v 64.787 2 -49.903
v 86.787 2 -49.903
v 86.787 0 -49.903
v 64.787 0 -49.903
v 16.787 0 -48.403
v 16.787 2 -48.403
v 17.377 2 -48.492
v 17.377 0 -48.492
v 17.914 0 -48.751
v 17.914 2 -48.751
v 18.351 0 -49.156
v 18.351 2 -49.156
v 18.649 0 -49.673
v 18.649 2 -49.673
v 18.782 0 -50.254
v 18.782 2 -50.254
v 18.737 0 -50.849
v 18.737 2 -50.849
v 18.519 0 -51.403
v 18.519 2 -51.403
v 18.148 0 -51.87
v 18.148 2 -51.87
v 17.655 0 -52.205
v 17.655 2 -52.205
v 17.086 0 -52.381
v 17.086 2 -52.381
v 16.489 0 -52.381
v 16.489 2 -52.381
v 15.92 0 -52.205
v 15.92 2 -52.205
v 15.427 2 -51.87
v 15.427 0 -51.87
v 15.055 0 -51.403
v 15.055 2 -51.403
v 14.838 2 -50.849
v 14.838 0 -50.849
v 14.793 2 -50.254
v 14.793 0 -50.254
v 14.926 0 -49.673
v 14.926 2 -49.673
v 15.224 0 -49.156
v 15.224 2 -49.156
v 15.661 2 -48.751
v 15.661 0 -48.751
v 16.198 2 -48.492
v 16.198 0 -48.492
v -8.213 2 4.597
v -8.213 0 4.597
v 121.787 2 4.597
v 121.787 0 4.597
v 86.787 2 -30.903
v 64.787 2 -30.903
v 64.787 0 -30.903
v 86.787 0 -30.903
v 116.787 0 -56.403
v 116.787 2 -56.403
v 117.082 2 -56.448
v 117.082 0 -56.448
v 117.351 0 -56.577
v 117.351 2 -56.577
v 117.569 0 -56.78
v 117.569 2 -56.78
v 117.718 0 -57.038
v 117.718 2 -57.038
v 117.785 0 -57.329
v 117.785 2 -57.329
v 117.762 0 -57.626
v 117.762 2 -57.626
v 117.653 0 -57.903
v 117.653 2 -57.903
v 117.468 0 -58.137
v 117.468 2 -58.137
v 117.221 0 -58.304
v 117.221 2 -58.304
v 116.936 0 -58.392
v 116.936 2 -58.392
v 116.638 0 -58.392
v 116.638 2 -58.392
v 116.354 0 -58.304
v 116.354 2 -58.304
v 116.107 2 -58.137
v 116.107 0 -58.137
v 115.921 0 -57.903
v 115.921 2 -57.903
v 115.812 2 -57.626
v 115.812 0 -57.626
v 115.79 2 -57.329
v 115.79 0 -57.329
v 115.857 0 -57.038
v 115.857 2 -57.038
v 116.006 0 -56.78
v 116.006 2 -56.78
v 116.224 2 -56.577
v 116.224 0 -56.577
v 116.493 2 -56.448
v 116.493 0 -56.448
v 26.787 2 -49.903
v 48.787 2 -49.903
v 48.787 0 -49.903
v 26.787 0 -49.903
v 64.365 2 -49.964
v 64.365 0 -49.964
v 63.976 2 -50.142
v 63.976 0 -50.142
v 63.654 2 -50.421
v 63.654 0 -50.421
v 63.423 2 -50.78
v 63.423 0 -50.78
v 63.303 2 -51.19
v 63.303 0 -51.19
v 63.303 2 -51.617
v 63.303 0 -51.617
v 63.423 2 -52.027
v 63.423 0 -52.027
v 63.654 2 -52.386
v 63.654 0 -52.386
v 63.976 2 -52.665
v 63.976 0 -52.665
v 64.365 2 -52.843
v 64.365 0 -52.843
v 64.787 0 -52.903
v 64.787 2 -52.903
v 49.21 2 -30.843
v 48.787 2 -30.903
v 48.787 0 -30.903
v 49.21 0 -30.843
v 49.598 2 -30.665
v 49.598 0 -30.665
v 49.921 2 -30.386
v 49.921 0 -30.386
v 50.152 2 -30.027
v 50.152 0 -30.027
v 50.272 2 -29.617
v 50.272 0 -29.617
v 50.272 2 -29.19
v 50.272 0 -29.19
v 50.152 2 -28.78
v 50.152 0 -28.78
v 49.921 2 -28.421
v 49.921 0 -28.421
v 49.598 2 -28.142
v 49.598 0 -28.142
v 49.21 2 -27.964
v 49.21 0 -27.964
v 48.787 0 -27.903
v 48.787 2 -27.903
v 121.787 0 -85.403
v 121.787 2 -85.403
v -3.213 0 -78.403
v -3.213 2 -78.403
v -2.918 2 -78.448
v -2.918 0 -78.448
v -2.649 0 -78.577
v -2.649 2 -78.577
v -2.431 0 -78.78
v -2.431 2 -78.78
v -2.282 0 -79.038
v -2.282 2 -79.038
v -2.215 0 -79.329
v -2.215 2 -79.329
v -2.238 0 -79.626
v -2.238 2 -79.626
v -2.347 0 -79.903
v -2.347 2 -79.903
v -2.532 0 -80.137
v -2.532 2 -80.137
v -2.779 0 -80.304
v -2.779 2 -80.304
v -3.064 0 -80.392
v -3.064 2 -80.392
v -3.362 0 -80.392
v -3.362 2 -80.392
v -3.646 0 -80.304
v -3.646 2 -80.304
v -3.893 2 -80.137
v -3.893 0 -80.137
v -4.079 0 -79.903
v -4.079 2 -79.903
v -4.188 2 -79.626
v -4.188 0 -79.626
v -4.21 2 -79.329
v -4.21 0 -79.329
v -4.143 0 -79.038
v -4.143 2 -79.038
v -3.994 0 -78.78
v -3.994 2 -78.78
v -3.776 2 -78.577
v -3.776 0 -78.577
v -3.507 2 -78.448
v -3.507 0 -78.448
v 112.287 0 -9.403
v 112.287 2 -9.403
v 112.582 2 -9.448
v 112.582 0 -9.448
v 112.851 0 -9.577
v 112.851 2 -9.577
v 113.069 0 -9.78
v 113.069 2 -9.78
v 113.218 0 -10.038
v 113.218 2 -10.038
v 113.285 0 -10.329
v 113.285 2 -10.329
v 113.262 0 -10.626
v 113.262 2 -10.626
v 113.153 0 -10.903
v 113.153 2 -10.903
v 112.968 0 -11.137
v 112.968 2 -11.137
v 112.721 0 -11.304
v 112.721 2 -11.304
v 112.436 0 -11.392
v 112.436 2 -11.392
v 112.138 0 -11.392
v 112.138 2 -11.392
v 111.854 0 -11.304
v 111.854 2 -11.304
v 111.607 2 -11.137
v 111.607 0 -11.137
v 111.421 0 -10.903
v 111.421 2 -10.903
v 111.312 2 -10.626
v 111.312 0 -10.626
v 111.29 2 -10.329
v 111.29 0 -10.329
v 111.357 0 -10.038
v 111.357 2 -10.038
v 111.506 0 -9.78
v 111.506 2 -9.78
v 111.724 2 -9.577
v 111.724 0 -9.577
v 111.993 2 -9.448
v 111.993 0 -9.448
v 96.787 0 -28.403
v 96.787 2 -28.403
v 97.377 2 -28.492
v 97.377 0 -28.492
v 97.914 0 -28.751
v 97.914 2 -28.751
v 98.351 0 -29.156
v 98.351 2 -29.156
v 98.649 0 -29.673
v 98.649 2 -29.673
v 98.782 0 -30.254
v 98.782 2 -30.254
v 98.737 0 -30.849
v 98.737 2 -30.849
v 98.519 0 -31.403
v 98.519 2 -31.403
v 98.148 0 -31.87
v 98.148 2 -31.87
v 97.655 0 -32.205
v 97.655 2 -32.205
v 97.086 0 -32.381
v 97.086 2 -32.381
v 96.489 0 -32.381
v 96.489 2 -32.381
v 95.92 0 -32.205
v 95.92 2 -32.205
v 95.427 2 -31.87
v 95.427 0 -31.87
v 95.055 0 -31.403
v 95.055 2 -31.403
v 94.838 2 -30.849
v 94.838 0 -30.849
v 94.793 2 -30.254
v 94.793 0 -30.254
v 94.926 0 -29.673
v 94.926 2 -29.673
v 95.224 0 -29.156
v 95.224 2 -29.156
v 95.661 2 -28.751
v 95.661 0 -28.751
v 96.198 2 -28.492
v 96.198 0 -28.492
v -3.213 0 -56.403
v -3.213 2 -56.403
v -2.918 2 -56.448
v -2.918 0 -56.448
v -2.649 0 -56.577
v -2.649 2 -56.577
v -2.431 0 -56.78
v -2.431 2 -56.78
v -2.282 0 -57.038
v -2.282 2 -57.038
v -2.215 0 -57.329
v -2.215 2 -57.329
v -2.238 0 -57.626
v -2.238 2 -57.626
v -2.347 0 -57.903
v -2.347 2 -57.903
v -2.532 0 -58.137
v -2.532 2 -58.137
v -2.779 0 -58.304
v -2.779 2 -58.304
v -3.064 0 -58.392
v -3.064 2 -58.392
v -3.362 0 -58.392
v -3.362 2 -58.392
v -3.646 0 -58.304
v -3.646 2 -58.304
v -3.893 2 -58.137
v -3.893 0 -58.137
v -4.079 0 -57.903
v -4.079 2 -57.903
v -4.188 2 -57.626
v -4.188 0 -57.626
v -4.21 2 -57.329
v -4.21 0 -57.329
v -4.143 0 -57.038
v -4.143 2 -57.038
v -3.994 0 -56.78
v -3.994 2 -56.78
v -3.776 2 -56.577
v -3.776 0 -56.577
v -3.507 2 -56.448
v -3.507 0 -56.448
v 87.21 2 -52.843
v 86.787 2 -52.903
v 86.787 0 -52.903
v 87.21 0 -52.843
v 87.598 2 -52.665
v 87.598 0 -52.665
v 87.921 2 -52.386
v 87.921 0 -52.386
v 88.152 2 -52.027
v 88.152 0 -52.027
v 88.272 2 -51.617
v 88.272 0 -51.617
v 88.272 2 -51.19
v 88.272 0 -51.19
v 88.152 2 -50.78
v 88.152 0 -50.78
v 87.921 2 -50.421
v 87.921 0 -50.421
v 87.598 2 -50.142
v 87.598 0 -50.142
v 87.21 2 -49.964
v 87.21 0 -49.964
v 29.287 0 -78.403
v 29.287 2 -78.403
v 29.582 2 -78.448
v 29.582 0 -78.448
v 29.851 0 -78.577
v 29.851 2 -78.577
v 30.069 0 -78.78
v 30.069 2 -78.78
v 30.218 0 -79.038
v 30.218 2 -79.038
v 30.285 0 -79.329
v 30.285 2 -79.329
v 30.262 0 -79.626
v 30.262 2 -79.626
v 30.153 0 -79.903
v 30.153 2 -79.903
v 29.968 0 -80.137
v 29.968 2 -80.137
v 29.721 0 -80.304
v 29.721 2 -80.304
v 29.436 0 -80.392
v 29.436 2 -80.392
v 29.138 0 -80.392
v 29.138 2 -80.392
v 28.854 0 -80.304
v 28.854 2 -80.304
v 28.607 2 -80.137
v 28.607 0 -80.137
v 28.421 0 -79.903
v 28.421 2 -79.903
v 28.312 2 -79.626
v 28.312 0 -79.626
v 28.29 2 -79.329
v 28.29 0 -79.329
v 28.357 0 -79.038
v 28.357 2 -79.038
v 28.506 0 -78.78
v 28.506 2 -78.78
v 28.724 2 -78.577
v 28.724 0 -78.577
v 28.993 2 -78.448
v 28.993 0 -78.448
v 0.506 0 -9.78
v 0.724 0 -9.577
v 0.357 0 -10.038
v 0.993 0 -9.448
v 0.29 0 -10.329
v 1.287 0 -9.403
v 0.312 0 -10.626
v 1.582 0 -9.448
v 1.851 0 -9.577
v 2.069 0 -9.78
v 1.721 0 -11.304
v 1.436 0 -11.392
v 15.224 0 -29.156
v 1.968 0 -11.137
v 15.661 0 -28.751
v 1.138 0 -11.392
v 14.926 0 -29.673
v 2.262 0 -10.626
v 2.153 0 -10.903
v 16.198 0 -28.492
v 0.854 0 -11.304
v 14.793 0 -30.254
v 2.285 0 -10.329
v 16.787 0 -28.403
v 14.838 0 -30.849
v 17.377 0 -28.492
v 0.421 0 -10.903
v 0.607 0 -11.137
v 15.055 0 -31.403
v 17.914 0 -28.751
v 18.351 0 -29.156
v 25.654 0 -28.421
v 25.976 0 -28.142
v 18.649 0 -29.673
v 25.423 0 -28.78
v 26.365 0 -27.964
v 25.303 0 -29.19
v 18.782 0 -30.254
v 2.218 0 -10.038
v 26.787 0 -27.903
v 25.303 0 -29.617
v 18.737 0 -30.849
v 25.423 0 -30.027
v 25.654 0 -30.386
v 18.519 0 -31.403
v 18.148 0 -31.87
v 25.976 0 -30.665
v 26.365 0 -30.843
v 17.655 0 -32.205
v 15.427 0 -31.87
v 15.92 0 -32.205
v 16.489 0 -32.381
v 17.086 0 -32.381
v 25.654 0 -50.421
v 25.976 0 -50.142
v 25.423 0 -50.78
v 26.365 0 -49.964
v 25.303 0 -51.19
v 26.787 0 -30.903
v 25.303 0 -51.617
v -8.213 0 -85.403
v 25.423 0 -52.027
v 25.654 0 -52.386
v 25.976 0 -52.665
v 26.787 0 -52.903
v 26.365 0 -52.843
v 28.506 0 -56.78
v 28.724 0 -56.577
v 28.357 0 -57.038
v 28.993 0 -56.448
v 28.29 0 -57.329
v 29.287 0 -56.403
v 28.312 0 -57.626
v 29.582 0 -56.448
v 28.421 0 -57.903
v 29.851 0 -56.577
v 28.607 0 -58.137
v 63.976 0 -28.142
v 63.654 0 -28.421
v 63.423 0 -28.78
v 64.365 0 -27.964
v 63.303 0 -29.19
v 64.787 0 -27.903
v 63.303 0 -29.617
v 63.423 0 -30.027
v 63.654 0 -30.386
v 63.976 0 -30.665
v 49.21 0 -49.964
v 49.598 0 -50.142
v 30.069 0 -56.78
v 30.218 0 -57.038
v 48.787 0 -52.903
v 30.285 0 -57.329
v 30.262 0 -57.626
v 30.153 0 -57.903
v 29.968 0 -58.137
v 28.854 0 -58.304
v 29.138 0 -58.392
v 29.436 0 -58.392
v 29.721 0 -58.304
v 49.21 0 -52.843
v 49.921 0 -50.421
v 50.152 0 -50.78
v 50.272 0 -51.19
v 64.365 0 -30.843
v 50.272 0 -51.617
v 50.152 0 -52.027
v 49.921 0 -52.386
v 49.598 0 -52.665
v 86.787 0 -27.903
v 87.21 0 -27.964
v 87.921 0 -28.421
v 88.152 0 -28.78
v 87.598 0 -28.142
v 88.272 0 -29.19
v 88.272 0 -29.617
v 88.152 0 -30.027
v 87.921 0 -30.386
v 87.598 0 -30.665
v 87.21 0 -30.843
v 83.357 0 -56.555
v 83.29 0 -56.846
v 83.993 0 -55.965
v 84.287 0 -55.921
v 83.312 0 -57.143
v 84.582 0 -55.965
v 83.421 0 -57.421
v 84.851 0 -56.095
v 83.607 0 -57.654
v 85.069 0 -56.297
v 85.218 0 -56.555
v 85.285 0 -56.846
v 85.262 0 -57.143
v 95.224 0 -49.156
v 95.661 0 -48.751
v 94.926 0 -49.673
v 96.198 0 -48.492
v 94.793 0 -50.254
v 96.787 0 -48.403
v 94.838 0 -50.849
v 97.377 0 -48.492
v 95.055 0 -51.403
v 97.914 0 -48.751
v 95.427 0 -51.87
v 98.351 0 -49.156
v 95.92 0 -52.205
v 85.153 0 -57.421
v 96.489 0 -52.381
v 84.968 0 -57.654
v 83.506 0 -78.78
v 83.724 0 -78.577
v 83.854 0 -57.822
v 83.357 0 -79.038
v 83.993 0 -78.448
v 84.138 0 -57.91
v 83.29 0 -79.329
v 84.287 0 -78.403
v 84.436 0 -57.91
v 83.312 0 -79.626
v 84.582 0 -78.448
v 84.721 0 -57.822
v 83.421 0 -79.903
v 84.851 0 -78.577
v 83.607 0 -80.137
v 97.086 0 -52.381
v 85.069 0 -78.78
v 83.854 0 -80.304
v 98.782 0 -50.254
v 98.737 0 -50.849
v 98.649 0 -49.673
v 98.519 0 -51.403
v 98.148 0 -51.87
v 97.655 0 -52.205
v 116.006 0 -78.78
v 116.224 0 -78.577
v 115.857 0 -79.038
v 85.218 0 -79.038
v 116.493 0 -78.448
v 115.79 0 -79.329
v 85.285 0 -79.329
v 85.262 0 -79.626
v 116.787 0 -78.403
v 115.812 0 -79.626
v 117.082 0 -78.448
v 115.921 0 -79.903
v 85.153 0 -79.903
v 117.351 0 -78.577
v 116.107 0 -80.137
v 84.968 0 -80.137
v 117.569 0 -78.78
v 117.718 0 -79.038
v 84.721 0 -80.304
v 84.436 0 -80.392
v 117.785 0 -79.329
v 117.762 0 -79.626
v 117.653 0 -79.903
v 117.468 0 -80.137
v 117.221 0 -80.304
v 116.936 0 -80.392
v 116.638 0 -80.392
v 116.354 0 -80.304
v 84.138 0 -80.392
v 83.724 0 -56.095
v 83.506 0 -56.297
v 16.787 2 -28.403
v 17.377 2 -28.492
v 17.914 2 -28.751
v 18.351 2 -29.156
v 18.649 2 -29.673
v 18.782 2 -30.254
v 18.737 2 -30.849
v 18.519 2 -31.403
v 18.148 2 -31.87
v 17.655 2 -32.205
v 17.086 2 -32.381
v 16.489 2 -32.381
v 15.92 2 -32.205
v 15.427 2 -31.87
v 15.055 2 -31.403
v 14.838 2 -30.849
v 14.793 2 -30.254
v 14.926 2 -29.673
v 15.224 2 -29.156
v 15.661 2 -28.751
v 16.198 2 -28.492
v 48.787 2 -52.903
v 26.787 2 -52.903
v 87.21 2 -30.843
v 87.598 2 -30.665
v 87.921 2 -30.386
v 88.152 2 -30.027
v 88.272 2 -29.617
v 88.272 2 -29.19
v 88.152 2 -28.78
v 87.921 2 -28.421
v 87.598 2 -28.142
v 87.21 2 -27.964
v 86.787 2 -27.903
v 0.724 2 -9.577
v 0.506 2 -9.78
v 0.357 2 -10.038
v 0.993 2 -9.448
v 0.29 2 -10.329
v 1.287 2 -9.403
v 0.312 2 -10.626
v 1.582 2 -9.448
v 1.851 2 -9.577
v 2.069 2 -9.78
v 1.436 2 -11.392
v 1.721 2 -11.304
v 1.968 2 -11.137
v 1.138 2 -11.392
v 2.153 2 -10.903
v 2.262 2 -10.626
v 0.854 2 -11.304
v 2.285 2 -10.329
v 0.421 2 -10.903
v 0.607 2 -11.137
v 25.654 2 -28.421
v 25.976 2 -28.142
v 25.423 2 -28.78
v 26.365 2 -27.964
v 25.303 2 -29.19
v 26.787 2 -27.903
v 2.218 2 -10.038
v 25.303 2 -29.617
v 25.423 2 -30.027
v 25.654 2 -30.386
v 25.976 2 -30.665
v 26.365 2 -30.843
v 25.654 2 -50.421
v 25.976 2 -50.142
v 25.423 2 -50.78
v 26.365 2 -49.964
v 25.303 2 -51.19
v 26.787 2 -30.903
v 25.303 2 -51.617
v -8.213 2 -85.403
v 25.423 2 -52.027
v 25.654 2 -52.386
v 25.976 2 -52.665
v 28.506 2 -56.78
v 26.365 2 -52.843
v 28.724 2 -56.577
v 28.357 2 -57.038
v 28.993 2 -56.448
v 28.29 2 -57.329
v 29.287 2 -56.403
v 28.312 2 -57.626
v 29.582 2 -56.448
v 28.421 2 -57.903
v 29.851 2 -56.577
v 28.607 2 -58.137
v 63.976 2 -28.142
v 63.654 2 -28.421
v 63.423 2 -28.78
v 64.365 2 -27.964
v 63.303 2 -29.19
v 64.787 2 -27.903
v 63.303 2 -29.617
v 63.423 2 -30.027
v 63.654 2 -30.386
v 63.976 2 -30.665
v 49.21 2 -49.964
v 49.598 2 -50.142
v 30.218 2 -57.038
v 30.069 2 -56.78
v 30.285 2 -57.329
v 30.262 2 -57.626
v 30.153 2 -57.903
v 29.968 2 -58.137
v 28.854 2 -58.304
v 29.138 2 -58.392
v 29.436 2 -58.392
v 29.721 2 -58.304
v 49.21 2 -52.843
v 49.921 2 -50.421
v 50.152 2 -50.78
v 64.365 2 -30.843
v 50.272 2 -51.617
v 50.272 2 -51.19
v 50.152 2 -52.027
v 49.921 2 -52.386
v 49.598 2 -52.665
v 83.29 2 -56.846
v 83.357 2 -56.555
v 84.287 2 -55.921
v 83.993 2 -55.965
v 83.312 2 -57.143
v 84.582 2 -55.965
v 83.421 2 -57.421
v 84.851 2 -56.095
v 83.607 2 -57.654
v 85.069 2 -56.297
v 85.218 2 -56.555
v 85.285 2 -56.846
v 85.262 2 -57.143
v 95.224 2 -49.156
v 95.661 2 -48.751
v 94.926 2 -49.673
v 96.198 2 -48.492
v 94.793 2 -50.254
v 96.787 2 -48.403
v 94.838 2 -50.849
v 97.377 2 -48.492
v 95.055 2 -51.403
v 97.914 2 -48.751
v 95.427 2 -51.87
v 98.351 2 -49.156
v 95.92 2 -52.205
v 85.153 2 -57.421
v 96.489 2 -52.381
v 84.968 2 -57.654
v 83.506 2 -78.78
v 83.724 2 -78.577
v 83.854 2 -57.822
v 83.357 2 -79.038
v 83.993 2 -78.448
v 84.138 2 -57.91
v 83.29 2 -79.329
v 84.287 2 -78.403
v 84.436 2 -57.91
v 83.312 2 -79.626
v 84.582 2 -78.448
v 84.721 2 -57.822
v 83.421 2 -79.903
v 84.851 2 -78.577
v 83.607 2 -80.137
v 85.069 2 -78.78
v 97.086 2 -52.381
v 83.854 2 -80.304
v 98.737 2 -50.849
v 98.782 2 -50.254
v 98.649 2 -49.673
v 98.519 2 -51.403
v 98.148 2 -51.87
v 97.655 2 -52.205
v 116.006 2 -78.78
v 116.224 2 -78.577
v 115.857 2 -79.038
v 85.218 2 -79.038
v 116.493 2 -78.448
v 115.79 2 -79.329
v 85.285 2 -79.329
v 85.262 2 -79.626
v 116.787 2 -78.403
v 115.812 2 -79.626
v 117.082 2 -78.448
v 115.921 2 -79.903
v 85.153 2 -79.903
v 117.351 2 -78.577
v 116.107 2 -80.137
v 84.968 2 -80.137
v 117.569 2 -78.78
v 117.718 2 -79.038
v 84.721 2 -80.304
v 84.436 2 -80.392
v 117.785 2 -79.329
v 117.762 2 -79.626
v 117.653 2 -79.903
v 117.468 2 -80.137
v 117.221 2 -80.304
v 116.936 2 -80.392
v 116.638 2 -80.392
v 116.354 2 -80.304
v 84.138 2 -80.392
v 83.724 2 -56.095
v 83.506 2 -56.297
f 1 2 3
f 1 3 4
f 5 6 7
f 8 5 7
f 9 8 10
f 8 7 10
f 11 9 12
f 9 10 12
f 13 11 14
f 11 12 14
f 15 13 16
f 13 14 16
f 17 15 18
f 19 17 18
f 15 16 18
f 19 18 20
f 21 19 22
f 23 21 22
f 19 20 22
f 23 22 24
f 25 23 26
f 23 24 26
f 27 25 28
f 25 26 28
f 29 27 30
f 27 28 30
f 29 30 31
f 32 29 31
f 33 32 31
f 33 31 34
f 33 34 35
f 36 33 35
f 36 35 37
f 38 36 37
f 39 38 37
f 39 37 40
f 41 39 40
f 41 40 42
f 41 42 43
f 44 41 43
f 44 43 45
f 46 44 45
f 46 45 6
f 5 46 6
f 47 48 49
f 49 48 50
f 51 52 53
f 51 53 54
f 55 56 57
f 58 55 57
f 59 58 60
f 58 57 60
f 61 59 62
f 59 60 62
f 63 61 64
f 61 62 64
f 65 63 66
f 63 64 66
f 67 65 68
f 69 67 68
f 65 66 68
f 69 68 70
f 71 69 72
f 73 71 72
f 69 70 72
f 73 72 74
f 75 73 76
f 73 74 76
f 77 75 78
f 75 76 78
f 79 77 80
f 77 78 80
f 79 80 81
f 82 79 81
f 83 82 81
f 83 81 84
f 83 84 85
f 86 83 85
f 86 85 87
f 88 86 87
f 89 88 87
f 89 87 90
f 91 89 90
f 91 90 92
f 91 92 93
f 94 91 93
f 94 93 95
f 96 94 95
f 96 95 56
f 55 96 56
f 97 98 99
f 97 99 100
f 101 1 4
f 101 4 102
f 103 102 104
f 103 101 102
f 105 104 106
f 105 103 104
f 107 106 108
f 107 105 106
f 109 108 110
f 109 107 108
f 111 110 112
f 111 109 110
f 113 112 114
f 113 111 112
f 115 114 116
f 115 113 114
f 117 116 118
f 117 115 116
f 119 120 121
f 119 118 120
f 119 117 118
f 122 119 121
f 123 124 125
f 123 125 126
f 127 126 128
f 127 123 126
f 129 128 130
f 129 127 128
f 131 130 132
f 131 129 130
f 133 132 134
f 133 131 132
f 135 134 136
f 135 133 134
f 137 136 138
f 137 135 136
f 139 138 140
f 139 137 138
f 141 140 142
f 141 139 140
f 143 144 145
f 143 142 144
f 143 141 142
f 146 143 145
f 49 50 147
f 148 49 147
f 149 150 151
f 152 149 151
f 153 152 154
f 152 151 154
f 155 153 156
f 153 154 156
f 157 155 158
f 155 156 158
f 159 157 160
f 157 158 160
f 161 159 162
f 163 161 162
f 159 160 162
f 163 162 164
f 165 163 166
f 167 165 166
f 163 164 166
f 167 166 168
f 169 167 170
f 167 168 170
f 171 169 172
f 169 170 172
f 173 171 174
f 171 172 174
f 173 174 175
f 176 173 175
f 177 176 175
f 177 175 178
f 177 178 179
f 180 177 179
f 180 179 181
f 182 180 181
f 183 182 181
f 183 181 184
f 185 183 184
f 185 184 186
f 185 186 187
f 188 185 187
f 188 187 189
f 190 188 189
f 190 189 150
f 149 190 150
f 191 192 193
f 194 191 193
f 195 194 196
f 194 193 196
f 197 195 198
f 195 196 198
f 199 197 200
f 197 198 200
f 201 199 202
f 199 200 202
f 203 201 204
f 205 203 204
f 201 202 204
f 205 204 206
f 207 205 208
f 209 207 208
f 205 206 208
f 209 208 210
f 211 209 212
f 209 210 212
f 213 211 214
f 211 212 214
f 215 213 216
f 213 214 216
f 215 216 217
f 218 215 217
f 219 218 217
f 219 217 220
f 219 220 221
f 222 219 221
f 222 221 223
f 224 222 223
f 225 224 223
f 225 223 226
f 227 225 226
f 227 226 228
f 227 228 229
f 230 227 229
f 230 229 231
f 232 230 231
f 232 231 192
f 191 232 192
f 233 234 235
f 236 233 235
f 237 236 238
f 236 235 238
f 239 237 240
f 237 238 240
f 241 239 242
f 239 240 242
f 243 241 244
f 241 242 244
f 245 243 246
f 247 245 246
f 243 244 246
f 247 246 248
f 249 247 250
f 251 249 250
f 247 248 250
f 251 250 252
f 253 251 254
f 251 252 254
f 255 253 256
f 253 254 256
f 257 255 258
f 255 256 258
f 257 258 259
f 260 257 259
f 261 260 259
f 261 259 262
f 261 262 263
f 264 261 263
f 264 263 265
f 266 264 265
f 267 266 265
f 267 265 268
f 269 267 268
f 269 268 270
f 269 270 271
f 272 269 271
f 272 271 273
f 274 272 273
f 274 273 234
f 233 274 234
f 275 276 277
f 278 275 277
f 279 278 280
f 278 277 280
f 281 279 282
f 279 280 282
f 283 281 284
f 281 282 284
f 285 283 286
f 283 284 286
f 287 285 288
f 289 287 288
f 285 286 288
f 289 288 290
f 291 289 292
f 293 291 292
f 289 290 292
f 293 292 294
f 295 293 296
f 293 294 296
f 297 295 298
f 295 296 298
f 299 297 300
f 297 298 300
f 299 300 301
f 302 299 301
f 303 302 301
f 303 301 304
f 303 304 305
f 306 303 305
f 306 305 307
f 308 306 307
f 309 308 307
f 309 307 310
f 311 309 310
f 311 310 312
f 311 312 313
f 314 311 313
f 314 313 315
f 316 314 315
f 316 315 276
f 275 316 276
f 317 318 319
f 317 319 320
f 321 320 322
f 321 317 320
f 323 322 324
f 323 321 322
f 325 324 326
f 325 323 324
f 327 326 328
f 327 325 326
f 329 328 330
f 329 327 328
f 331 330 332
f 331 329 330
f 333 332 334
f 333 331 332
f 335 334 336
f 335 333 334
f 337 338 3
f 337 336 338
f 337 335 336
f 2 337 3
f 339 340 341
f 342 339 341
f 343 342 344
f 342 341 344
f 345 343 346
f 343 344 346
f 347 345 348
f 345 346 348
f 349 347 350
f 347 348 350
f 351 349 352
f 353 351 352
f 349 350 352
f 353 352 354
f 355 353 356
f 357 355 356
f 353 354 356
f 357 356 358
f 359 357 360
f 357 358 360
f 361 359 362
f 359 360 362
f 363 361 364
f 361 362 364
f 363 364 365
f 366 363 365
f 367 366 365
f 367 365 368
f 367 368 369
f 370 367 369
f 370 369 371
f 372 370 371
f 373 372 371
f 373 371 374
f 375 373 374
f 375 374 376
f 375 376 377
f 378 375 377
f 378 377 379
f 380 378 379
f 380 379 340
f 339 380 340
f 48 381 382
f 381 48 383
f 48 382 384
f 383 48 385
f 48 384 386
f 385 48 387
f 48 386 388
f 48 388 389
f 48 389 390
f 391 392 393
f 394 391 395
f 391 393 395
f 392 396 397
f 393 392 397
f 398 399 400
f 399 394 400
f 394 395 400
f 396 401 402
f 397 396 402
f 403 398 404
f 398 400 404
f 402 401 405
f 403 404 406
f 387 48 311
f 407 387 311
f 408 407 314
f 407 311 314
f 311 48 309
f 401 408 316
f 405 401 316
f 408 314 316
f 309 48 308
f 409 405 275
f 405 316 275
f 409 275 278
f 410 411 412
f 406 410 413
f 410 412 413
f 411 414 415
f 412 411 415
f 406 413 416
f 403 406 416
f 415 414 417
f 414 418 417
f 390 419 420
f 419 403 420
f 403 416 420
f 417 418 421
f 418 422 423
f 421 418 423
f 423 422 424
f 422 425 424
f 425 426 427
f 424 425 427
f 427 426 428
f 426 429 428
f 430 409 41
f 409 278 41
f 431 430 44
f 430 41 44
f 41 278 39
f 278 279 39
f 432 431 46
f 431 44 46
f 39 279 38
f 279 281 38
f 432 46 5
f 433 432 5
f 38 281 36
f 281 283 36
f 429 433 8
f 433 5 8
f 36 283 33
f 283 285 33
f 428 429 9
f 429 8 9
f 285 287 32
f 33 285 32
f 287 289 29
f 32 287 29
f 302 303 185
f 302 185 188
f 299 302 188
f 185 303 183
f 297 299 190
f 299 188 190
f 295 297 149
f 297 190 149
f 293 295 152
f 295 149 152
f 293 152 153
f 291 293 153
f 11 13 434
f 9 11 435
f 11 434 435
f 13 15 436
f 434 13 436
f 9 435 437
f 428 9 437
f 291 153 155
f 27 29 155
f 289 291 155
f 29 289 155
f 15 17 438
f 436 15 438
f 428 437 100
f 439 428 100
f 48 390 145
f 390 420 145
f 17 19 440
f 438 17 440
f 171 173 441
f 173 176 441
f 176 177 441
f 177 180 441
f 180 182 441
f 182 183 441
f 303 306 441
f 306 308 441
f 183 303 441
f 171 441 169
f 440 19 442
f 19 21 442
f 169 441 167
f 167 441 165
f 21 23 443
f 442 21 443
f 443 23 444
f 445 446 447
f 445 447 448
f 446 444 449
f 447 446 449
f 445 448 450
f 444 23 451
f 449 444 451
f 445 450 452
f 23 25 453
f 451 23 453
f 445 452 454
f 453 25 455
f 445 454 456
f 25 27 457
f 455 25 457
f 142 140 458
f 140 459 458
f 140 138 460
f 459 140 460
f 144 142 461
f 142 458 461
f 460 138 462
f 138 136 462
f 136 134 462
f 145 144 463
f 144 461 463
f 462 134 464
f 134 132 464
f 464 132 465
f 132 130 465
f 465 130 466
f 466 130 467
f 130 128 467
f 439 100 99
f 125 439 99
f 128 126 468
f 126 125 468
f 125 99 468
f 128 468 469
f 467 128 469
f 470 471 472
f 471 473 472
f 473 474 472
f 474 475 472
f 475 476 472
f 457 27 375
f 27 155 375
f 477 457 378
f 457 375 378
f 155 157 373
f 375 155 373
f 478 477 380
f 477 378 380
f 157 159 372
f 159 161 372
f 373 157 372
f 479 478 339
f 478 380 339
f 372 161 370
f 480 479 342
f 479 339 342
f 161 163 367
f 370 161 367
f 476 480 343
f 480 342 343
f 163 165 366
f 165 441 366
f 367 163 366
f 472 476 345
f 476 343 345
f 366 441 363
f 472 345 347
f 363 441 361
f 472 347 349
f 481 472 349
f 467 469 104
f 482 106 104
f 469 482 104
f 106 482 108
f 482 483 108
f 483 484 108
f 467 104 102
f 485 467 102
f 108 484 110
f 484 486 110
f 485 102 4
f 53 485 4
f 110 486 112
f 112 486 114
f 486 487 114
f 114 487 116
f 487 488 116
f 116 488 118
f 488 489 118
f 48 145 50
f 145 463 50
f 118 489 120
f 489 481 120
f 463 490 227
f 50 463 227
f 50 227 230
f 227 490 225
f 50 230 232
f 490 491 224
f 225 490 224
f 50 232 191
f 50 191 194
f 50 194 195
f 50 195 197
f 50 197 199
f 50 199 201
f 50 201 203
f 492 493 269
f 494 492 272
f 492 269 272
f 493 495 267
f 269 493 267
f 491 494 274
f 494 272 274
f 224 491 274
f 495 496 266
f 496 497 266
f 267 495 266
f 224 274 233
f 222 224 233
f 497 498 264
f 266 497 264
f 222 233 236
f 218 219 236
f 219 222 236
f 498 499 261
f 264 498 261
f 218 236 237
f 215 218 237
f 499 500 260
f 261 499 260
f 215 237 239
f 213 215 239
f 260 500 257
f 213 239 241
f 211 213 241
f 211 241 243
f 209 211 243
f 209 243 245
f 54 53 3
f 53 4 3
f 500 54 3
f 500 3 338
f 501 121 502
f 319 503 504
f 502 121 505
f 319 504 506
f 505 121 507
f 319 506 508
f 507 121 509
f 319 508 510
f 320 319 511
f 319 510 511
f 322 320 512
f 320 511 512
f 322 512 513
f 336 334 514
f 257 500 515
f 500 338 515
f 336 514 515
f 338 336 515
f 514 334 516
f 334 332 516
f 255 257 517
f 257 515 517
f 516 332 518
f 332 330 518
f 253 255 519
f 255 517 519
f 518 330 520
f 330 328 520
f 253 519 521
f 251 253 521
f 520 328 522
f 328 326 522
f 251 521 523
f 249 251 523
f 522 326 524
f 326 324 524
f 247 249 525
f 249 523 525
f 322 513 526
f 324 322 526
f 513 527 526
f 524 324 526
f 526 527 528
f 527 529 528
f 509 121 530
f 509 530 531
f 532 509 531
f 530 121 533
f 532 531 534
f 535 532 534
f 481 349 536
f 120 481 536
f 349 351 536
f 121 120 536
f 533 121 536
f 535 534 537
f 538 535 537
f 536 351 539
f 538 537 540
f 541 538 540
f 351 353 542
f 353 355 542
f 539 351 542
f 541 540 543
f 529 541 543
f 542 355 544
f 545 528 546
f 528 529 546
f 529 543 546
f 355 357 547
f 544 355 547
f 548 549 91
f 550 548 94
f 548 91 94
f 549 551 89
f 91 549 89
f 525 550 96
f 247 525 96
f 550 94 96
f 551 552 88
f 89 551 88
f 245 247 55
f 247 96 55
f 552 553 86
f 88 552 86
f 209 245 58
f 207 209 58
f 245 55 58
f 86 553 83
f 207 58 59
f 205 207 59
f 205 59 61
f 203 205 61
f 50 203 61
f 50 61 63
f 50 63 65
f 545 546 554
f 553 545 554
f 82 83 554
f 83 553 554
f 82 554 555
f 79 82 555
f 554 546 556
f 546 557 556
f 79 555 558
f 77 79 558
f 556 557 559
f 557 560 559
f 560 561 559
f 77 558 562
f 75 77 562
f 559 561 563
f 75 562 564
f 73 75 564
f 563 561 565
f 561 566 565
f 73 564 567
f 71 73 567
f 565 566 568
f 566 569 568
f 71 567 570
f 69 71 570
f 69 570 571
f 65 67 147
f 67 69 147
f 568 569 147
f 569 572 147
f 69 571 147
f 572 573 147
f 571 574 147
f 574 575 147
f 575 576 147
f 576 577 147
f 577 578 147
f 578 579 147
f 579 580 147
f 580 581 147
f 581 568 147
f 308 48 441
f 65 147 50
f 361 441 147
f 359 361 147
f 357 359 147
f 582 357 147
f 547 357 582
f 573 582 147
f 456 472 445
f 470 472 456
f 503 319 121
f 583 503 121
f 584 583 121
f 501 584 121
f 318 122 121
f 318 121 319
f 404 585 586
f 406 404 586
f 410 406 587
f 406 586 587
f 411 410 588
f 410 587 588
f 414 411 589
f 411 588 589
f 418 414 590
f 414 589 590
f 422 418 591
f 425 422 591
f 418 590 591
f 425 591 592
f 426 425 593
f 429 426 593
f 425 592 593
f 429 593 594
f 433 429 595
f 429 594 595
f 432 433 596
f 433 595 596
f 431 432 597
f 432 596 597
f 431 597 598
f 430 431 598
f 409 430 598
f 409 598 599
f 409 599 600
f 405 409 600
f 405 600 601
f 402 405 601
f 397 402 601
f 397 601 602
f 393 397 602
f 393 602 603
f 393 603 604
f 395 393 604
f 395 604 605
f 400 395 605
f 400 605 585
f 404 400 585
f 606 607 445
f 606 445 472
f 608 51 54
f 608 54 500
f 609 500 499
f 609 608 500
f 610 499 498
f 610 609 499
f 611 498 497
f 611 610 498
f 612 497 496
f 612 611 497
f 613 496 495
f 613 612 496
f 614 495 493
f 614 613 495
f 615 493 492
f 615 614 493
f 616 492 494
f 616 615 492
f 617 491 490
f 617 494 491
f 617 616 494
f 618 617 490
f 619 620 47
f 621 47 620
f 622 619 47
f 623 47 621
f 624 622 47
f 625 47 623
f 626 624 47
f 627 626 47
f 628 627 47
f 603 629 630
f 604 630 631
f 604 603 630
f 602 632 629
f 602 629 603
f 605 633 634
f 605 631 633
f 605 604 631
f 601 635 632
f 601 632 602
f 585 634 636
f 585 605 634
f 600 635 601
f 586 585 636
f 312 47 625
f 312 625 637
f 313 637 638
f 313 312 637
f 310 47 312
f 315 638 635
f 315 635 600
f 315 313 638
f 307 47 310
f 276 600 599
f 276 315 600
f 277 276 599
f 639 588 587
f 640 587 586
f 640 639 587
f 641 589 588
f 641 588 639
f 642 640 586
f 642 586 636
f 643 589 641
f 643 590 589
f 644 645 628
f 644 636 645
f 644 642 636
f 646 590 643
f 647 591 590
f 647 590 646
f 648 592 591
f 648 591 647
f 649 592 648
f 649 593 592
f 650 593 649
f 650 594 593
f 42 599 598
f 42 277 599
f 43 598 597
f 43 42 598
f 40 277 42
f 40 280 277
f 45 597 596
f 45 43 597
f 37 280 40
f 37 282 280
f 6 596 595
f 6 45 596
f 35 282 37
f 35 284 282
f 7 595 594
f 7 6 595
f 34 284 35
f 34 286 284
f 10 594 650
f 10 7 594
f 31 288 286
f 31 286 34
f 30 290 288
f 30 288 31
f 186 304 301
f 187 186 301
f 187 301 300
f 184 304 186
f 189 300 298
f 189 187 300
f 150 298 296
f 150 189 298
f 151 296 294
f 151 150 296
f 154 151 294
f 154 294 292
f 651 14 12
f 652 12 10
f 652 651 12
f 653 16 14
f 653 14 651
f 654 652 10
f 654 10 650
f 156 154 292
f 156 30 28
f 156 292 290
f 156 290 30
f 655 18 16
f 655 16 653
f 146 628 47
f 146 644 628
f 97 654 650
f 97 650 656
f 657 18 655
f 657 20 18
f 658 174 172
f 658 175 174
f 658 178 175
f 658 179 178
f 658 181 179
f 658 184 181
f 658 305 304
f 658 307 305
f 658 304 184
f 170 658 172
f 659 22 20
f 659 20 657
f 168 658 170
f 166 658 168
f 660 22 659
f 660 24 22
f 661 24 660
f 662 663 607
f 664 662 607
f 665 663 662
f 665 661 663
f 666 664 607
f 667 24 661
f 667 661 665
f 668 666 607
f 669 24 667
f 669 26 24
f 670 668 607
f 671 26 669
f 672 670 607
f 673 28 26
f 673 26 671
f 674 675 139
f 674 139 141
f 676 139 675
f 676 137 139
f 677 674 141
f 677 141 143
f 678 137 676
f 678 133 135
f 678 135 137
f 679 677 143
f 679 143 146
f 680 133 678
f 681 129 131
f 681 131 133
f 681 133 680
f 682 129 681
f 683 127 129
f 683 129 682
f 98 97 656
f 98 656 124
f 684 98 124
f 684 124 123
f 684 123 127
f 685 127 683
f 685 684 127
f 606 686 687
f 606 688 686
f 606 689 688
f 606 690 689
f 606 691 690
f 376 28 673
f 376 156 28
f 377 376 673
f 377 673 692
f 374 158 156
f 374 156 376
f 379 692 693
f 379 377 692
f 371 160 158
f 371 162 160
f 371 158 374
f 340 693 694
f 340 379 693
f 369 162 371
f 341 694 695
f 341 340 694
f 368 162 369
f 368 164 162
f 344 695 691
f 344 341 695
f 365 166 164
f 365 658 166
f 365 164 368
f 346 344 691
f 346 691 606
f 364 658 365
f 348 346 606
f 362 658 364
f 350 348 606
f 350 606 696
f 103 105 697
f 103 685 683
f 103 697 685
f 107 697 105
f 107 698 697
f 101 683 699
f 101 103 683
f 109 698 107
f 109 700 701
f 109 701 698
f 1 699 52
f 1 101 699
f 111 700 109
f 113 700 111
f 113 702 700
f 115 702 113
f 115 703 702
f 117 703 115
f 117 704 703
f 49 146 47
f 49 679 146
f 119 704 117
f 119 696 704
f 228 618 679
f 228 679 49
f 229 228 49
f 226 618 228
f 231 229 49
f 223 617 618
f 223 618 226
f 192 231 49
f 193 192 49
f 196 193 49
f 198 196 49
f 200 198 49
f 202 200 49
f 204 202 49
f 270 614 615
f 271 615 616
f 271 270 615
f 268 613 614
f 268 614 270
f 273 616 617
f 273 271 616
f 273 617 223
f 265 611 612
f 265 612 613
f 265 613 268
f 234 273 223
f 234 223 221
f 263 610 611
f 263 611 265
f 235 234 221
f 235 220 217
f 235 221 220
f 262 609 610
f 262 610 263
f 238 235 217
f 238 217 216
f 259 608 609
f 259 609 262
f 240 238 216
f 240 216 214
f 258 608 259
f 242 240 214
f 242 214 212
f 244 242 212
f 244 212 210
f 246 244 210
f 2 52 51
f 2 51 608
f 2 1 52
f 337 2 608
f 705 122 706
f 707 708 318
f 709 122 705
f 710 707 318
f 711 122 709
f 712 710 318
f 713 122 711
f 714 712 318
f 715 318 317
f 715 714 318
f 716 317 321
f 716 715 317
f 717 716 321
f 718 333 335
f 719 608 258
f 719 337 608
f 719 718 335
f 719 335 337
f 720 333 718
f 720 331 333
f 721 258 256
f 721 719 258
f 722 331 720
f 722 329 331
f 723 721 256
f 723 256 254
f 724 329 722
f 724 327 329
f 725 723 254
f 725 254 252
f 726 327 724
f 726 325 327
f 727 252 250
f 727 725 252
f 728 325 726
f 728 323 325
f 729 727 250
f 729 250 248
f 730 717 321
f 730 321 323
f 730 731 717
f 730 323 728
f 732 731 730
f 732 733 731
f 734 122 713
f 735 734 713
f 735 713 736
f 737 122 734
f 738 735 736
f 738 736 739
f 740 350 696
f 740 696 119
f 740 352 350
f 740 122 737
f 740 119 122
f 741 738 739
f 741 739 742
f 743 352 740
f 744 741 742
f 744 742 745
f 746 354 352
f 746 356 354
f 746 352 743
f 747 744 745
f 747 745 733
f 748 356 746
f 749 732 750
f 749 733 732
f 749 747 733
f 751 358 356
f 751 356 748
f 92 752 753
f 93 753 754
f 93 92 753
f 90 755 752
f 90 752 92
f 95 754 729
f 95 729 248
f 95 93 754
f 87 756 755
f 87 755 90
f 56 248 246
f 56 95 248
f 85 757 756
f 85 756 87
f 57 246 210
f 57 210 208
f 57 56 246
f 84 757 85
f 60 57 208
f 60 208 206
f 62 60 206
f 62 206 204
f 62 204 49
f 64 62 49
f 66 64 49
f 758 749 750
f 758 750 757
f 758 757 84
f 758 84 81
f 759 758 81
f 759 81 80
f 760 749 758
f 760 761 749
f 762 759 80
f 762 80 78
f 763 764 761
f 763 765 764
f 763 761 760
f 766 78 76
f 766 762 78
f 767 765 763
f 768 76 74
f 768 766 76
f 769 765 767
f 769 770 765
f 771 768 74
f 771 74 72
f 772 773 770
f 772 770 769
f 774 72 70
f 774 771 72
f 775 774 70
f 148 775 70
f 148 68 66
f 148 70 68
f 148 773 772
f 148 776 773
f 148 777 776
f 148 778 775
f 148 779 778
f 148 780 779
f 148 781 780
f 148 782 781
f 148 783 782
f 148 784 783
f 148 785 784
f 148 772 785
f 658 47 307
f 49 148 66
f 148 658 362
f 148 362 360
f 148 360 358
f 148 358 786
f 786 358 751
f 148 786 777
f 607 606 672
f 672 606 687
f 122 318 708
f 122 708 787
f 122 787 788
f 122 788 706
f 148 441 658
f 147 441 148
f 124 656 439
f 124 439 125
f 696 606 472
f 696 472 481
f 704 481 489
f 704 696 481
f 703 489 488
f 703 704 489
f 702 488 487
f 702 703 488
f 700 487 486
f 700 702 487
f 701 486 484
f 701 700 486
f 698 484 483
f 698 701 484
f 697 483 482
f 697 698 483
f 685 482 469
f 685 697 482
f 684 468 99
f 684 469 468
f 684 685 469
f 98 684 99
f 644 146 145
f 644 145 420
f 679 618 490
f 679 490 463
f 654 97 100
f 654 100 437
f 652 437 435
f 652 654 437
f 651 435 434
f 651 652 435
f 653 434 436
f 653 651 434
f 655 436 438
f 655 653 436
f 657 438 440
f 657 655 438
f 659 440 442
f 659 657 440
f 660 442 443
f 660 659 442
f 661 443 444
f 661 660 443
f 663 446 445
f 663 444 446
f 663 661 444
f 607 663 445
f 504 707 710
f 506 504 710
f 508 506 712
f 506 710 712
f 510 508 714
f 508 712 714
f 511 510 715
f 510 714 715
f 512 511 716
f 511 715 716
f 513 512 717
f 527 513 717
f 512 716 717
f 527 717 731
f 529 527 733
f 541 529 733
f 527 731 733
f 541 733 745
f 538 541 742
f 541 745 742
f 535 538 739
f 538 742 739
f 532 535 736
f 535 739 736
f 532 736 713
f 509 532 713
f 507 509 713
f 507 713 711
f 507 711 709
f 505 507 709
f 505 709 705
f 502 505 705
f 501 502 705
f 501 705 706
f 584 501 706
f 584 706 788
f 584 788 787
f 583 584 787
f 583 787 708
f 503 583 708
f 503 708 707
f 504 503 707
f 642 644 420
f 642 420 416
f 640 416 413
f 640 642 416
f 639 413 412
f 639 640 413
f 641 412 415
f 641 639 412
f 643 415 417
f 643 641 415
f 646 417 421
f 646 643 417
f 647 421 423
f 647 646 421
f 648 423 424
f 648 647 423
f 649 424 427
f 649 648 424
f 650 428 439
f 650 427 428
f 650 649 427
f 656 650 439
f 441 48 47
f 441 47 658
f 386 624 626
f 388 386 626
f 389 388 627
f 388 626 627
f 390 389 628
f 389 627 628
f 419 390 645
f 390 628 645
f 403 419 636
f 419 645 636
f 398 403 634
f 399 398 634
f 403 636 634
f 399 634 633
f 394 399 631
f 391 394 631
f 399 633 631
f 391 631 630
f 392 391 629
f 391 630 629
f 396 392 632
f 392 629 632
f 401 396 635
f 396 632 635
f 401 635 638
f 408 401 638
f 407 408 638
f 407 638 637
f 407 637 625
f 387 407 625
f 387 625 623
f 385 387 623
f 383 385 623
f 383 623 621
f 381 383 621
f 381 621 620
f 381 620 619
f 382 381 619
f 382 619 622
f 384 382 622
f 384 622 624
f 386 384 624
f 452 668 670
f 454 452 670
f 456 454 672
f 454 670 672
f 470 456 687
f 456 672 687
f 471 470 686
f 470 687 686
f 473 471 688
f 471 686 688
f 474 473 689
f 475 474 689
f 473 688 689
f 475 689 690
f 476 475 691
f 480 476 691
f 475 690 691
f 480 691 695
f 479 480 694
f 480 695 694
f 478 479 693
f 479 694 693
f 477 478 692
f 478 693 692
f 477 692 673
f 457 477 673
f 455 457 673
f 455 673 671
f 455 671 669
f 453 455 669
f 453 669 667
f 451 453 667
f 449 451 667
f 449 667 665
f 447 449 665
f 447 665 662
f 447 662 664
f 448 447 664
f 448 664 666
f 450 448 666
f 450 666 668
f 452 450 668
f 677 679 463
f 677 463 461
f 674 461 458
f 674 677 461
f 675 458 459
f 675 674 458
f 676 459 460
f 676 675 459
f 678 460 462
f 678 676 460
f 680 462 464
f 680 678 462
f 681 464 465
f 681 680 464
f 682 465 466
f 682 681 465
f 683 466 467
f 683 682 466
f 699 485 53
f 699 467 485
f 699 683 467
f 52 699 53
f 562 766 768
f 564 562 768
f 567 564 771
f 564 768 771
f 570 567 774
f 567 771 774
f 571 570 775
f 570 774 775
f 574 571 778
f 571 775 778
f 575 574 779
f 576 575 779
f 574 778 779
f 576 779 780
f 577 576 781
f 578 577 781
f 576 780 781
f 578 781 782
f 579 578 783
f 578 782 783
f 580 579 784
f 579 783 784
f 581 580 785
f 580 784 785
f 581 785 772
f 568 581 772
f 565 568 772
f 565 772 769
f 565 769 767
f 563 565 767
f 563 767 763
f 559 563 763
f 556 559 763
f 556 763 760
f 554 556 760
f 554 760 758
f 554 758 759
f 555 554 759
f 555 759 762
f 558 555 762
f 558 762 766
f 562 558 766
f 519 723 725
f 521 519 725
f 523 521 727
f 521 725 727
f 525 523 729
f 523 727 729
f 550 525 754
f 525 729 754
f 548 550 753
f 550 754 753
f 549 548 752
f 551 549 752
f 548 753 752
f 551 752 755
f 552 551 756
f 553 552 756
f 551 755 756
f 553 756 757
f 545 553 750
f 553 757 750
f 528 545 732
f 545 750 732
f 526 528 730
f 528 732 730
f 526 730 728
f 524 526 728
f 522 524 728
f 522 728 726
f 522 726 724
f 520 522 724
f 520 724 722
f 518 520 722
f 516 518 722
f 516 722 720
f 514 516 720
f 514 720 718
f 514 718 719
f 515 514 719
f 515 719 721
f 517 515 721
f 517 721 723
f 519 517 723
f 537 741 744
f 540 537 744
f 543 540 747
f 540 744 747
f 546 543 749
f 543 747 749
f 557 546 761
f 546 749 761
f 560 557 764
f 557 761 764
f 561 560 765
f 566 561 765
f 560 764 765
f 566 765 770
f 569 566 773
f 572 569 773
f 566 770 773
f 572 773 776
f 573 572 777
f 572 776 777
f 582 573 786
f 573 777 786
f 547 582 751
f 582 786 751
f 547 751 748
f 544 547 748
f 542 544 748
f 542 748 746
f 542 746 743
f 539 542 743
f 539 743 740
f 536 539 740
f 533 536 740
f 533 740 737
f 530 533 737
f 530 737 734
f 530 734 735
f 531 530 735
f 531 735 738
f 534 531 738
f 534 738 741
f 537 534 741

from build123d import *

# Parameters (mm, degrees)
SKETCH1_W           = 130
SKETCH1_H           = 90
BOSS_EXTRUDE2_DEPTH = 2
SKETCH2_R           = 2
CUT_EXTRUDE1_DEPTH  = 10
CUT_EXTRUDE3_DEPTH  = 10
SKETCH5_R           = 1
CUT_EXTRUDE4_DEPTH  = 10


with BuildPart() as part:
    # Sketch1 → Boss-Extrude2 (new body)
    with BuildSketch(Plane(origin=(0, 0, 0), x_dir=(1, 0, 0), z_dir=(0, 1, 0))):
        with Locations((56.787418592, 40.403463793)):
            Rectangle(SKETCH1_W, SKETCH1_H)
    extrude(amount=BOSS_EXTRUDE2_DEPTH)

    # Sketch2 → Cut-Extrude1 (cut)
    with BuildSketch(Plane(origin=(0, 2, 0), x_dir=(1, 0, 0), z_dir=(0, 1, 0))):
        with Locations(Location((16.787418592, 50.403463793, 0), (0, 0, 270))):
            Circle(SKETCH2_R)
        with Locations(Location((16.787418592, 30.403463793, 0), (0, 0, 270))):
            Circle(SKETCH2_R)
        with Locations(Location((96.787418592, 50.403463793, 0), (0, 0, 270))):
            Circle(SKETCH2_R)
        with Locations(Location((96.787418592, 30.403463793, 0), (0, 0, 270))):
            Circle(SKETCH2_R)
    extrude(amount=-CUT_EXTRUDE1_DEPTH, mode=Mode.SUBTRACT)

    # Sketch4 → Cut-Extrude3 (cut)
    with BuildSketch(Plane(origin=(0, 2, 0), x_dir=(1, 0, 0), z_dir=(0, 1, 0))):
        with BuildLine():
            Line((26.787418592, 52.903463793), (48.787418592, 52.903463793))
            ThreePointArc((48.787418592, 52.903463793), (50.287418592, 51.403463793), (48.787418592, 49.903463793))
            Line((48.787418592, 49.903463793), (26.787418592, 49.903463793))
            ThreePointArc((26.787418592, 49.903463793), (25.287418592, 51.403463793), (26.787418592, 52.903463793))
        make_face()
        with BuildLine():
            Line((26.787418592, 30.903463793), (48.787418592, 30.903463793))
            ThreePointArc((48.787418592, 30.903463793), (50.287418592, 29.403463793), (48.787418592, 27.903463793))
            Line((48.787418592, 27.903463793), (26.787418592, 27.903463793))
            ThreePointArc((26.787418592, 27.903463793), (25.287418592, 29.403463793), (26.787418592, 30.903463793))
        make_face()
        with BuildLine():
            Line((64.787418592, 52.903463793), (86.787418592, 52.903463793))
            ThreePointArc((86.787418592, 52.903463793), (88.287418592, 51.403463793), (86.787418592, 49.903463793))
            Line((86.787418592, 49.903463793), (64.787418592, 49.903463793))
            ThreePointArc((64.787418592, 49.903463793), (63.287418592, 51.403463793), (64.787418592, 52.903463793))
        make_face()
        with BuildLine():
            Line((64.787418592, 30.903463793), (86.787418592, 30.903463793))
            ThreePointArc((86.787418592, 30.903463793), (88.287418592, 29.403463793), (86.787418592, 27.903463793))
            Line((86.787418592, 27.903463793), (64.787418592, 27.903463793))
            ThreePointArc((64.787418592, 27.903463793), (63.287418592, 29.403463793), (64.787418592, 30.903463793))
        make_face()
    extrude(amount=-CUT_EXTRUDE3_DEPTH, mode=Mode.SUBTRACT)

    # Sketch5 → Cut-Extrude4 (cut)
    with BuildSketch(Plane(origin=(0, 2, 0), x_dir=(1, 0, 0), z_dir=(0, 1, 0))):
        with Locations(Location((1.287418592, 10.403463793, 0), (0, 0, 270))):
            Circle(SKETCH5_R)
        with Locations(Location((112.287418592, 10.403463793, 0), (0, 0, 270))):
            Circle(SKETCH5_R)
        with Locations(Location((84.287418592, 56.920801797, 0), (0, 0, 270))):
            Circle(SKETCH5_R)
        with Locations(Location((116.787418592, 57.403463793, 0), (0, 0, 270))):
            Circle(SKETCH5_R)
        with Locations(Location((116.787418592, 79.403463793, 0), (0, 0, 270))):
            Circle(SKETCH5_R)
        with Locations(Location((84.287418592, 79.403463793, 0), (0, 0, 270))):
            Circle(SKETCH5_R)
        with Locations(Location((-3.212581408, 57.403463793, 0), (0, 0, 270))):
            Circle(SKETCH5_R)
        with Locations(Location((29.287418592, 57.403463793, 0), (0, 0, 270))):
            Circle(SKETCH5_R)
        with Locations(Location((29.287418592, 79.403463793, 0), (0, 0, 270))):
            Circle(SKETCH5_R)
        with Locations(Location((-3.212581408, 79.403463793, 0), (0, 0, 270))):
            Circle(SKETCH5_R)
    extrude(amount=-CUT_EXTRUDE4_DEPTH, mode=Mode.SUBTRACT)


solid = part.part
